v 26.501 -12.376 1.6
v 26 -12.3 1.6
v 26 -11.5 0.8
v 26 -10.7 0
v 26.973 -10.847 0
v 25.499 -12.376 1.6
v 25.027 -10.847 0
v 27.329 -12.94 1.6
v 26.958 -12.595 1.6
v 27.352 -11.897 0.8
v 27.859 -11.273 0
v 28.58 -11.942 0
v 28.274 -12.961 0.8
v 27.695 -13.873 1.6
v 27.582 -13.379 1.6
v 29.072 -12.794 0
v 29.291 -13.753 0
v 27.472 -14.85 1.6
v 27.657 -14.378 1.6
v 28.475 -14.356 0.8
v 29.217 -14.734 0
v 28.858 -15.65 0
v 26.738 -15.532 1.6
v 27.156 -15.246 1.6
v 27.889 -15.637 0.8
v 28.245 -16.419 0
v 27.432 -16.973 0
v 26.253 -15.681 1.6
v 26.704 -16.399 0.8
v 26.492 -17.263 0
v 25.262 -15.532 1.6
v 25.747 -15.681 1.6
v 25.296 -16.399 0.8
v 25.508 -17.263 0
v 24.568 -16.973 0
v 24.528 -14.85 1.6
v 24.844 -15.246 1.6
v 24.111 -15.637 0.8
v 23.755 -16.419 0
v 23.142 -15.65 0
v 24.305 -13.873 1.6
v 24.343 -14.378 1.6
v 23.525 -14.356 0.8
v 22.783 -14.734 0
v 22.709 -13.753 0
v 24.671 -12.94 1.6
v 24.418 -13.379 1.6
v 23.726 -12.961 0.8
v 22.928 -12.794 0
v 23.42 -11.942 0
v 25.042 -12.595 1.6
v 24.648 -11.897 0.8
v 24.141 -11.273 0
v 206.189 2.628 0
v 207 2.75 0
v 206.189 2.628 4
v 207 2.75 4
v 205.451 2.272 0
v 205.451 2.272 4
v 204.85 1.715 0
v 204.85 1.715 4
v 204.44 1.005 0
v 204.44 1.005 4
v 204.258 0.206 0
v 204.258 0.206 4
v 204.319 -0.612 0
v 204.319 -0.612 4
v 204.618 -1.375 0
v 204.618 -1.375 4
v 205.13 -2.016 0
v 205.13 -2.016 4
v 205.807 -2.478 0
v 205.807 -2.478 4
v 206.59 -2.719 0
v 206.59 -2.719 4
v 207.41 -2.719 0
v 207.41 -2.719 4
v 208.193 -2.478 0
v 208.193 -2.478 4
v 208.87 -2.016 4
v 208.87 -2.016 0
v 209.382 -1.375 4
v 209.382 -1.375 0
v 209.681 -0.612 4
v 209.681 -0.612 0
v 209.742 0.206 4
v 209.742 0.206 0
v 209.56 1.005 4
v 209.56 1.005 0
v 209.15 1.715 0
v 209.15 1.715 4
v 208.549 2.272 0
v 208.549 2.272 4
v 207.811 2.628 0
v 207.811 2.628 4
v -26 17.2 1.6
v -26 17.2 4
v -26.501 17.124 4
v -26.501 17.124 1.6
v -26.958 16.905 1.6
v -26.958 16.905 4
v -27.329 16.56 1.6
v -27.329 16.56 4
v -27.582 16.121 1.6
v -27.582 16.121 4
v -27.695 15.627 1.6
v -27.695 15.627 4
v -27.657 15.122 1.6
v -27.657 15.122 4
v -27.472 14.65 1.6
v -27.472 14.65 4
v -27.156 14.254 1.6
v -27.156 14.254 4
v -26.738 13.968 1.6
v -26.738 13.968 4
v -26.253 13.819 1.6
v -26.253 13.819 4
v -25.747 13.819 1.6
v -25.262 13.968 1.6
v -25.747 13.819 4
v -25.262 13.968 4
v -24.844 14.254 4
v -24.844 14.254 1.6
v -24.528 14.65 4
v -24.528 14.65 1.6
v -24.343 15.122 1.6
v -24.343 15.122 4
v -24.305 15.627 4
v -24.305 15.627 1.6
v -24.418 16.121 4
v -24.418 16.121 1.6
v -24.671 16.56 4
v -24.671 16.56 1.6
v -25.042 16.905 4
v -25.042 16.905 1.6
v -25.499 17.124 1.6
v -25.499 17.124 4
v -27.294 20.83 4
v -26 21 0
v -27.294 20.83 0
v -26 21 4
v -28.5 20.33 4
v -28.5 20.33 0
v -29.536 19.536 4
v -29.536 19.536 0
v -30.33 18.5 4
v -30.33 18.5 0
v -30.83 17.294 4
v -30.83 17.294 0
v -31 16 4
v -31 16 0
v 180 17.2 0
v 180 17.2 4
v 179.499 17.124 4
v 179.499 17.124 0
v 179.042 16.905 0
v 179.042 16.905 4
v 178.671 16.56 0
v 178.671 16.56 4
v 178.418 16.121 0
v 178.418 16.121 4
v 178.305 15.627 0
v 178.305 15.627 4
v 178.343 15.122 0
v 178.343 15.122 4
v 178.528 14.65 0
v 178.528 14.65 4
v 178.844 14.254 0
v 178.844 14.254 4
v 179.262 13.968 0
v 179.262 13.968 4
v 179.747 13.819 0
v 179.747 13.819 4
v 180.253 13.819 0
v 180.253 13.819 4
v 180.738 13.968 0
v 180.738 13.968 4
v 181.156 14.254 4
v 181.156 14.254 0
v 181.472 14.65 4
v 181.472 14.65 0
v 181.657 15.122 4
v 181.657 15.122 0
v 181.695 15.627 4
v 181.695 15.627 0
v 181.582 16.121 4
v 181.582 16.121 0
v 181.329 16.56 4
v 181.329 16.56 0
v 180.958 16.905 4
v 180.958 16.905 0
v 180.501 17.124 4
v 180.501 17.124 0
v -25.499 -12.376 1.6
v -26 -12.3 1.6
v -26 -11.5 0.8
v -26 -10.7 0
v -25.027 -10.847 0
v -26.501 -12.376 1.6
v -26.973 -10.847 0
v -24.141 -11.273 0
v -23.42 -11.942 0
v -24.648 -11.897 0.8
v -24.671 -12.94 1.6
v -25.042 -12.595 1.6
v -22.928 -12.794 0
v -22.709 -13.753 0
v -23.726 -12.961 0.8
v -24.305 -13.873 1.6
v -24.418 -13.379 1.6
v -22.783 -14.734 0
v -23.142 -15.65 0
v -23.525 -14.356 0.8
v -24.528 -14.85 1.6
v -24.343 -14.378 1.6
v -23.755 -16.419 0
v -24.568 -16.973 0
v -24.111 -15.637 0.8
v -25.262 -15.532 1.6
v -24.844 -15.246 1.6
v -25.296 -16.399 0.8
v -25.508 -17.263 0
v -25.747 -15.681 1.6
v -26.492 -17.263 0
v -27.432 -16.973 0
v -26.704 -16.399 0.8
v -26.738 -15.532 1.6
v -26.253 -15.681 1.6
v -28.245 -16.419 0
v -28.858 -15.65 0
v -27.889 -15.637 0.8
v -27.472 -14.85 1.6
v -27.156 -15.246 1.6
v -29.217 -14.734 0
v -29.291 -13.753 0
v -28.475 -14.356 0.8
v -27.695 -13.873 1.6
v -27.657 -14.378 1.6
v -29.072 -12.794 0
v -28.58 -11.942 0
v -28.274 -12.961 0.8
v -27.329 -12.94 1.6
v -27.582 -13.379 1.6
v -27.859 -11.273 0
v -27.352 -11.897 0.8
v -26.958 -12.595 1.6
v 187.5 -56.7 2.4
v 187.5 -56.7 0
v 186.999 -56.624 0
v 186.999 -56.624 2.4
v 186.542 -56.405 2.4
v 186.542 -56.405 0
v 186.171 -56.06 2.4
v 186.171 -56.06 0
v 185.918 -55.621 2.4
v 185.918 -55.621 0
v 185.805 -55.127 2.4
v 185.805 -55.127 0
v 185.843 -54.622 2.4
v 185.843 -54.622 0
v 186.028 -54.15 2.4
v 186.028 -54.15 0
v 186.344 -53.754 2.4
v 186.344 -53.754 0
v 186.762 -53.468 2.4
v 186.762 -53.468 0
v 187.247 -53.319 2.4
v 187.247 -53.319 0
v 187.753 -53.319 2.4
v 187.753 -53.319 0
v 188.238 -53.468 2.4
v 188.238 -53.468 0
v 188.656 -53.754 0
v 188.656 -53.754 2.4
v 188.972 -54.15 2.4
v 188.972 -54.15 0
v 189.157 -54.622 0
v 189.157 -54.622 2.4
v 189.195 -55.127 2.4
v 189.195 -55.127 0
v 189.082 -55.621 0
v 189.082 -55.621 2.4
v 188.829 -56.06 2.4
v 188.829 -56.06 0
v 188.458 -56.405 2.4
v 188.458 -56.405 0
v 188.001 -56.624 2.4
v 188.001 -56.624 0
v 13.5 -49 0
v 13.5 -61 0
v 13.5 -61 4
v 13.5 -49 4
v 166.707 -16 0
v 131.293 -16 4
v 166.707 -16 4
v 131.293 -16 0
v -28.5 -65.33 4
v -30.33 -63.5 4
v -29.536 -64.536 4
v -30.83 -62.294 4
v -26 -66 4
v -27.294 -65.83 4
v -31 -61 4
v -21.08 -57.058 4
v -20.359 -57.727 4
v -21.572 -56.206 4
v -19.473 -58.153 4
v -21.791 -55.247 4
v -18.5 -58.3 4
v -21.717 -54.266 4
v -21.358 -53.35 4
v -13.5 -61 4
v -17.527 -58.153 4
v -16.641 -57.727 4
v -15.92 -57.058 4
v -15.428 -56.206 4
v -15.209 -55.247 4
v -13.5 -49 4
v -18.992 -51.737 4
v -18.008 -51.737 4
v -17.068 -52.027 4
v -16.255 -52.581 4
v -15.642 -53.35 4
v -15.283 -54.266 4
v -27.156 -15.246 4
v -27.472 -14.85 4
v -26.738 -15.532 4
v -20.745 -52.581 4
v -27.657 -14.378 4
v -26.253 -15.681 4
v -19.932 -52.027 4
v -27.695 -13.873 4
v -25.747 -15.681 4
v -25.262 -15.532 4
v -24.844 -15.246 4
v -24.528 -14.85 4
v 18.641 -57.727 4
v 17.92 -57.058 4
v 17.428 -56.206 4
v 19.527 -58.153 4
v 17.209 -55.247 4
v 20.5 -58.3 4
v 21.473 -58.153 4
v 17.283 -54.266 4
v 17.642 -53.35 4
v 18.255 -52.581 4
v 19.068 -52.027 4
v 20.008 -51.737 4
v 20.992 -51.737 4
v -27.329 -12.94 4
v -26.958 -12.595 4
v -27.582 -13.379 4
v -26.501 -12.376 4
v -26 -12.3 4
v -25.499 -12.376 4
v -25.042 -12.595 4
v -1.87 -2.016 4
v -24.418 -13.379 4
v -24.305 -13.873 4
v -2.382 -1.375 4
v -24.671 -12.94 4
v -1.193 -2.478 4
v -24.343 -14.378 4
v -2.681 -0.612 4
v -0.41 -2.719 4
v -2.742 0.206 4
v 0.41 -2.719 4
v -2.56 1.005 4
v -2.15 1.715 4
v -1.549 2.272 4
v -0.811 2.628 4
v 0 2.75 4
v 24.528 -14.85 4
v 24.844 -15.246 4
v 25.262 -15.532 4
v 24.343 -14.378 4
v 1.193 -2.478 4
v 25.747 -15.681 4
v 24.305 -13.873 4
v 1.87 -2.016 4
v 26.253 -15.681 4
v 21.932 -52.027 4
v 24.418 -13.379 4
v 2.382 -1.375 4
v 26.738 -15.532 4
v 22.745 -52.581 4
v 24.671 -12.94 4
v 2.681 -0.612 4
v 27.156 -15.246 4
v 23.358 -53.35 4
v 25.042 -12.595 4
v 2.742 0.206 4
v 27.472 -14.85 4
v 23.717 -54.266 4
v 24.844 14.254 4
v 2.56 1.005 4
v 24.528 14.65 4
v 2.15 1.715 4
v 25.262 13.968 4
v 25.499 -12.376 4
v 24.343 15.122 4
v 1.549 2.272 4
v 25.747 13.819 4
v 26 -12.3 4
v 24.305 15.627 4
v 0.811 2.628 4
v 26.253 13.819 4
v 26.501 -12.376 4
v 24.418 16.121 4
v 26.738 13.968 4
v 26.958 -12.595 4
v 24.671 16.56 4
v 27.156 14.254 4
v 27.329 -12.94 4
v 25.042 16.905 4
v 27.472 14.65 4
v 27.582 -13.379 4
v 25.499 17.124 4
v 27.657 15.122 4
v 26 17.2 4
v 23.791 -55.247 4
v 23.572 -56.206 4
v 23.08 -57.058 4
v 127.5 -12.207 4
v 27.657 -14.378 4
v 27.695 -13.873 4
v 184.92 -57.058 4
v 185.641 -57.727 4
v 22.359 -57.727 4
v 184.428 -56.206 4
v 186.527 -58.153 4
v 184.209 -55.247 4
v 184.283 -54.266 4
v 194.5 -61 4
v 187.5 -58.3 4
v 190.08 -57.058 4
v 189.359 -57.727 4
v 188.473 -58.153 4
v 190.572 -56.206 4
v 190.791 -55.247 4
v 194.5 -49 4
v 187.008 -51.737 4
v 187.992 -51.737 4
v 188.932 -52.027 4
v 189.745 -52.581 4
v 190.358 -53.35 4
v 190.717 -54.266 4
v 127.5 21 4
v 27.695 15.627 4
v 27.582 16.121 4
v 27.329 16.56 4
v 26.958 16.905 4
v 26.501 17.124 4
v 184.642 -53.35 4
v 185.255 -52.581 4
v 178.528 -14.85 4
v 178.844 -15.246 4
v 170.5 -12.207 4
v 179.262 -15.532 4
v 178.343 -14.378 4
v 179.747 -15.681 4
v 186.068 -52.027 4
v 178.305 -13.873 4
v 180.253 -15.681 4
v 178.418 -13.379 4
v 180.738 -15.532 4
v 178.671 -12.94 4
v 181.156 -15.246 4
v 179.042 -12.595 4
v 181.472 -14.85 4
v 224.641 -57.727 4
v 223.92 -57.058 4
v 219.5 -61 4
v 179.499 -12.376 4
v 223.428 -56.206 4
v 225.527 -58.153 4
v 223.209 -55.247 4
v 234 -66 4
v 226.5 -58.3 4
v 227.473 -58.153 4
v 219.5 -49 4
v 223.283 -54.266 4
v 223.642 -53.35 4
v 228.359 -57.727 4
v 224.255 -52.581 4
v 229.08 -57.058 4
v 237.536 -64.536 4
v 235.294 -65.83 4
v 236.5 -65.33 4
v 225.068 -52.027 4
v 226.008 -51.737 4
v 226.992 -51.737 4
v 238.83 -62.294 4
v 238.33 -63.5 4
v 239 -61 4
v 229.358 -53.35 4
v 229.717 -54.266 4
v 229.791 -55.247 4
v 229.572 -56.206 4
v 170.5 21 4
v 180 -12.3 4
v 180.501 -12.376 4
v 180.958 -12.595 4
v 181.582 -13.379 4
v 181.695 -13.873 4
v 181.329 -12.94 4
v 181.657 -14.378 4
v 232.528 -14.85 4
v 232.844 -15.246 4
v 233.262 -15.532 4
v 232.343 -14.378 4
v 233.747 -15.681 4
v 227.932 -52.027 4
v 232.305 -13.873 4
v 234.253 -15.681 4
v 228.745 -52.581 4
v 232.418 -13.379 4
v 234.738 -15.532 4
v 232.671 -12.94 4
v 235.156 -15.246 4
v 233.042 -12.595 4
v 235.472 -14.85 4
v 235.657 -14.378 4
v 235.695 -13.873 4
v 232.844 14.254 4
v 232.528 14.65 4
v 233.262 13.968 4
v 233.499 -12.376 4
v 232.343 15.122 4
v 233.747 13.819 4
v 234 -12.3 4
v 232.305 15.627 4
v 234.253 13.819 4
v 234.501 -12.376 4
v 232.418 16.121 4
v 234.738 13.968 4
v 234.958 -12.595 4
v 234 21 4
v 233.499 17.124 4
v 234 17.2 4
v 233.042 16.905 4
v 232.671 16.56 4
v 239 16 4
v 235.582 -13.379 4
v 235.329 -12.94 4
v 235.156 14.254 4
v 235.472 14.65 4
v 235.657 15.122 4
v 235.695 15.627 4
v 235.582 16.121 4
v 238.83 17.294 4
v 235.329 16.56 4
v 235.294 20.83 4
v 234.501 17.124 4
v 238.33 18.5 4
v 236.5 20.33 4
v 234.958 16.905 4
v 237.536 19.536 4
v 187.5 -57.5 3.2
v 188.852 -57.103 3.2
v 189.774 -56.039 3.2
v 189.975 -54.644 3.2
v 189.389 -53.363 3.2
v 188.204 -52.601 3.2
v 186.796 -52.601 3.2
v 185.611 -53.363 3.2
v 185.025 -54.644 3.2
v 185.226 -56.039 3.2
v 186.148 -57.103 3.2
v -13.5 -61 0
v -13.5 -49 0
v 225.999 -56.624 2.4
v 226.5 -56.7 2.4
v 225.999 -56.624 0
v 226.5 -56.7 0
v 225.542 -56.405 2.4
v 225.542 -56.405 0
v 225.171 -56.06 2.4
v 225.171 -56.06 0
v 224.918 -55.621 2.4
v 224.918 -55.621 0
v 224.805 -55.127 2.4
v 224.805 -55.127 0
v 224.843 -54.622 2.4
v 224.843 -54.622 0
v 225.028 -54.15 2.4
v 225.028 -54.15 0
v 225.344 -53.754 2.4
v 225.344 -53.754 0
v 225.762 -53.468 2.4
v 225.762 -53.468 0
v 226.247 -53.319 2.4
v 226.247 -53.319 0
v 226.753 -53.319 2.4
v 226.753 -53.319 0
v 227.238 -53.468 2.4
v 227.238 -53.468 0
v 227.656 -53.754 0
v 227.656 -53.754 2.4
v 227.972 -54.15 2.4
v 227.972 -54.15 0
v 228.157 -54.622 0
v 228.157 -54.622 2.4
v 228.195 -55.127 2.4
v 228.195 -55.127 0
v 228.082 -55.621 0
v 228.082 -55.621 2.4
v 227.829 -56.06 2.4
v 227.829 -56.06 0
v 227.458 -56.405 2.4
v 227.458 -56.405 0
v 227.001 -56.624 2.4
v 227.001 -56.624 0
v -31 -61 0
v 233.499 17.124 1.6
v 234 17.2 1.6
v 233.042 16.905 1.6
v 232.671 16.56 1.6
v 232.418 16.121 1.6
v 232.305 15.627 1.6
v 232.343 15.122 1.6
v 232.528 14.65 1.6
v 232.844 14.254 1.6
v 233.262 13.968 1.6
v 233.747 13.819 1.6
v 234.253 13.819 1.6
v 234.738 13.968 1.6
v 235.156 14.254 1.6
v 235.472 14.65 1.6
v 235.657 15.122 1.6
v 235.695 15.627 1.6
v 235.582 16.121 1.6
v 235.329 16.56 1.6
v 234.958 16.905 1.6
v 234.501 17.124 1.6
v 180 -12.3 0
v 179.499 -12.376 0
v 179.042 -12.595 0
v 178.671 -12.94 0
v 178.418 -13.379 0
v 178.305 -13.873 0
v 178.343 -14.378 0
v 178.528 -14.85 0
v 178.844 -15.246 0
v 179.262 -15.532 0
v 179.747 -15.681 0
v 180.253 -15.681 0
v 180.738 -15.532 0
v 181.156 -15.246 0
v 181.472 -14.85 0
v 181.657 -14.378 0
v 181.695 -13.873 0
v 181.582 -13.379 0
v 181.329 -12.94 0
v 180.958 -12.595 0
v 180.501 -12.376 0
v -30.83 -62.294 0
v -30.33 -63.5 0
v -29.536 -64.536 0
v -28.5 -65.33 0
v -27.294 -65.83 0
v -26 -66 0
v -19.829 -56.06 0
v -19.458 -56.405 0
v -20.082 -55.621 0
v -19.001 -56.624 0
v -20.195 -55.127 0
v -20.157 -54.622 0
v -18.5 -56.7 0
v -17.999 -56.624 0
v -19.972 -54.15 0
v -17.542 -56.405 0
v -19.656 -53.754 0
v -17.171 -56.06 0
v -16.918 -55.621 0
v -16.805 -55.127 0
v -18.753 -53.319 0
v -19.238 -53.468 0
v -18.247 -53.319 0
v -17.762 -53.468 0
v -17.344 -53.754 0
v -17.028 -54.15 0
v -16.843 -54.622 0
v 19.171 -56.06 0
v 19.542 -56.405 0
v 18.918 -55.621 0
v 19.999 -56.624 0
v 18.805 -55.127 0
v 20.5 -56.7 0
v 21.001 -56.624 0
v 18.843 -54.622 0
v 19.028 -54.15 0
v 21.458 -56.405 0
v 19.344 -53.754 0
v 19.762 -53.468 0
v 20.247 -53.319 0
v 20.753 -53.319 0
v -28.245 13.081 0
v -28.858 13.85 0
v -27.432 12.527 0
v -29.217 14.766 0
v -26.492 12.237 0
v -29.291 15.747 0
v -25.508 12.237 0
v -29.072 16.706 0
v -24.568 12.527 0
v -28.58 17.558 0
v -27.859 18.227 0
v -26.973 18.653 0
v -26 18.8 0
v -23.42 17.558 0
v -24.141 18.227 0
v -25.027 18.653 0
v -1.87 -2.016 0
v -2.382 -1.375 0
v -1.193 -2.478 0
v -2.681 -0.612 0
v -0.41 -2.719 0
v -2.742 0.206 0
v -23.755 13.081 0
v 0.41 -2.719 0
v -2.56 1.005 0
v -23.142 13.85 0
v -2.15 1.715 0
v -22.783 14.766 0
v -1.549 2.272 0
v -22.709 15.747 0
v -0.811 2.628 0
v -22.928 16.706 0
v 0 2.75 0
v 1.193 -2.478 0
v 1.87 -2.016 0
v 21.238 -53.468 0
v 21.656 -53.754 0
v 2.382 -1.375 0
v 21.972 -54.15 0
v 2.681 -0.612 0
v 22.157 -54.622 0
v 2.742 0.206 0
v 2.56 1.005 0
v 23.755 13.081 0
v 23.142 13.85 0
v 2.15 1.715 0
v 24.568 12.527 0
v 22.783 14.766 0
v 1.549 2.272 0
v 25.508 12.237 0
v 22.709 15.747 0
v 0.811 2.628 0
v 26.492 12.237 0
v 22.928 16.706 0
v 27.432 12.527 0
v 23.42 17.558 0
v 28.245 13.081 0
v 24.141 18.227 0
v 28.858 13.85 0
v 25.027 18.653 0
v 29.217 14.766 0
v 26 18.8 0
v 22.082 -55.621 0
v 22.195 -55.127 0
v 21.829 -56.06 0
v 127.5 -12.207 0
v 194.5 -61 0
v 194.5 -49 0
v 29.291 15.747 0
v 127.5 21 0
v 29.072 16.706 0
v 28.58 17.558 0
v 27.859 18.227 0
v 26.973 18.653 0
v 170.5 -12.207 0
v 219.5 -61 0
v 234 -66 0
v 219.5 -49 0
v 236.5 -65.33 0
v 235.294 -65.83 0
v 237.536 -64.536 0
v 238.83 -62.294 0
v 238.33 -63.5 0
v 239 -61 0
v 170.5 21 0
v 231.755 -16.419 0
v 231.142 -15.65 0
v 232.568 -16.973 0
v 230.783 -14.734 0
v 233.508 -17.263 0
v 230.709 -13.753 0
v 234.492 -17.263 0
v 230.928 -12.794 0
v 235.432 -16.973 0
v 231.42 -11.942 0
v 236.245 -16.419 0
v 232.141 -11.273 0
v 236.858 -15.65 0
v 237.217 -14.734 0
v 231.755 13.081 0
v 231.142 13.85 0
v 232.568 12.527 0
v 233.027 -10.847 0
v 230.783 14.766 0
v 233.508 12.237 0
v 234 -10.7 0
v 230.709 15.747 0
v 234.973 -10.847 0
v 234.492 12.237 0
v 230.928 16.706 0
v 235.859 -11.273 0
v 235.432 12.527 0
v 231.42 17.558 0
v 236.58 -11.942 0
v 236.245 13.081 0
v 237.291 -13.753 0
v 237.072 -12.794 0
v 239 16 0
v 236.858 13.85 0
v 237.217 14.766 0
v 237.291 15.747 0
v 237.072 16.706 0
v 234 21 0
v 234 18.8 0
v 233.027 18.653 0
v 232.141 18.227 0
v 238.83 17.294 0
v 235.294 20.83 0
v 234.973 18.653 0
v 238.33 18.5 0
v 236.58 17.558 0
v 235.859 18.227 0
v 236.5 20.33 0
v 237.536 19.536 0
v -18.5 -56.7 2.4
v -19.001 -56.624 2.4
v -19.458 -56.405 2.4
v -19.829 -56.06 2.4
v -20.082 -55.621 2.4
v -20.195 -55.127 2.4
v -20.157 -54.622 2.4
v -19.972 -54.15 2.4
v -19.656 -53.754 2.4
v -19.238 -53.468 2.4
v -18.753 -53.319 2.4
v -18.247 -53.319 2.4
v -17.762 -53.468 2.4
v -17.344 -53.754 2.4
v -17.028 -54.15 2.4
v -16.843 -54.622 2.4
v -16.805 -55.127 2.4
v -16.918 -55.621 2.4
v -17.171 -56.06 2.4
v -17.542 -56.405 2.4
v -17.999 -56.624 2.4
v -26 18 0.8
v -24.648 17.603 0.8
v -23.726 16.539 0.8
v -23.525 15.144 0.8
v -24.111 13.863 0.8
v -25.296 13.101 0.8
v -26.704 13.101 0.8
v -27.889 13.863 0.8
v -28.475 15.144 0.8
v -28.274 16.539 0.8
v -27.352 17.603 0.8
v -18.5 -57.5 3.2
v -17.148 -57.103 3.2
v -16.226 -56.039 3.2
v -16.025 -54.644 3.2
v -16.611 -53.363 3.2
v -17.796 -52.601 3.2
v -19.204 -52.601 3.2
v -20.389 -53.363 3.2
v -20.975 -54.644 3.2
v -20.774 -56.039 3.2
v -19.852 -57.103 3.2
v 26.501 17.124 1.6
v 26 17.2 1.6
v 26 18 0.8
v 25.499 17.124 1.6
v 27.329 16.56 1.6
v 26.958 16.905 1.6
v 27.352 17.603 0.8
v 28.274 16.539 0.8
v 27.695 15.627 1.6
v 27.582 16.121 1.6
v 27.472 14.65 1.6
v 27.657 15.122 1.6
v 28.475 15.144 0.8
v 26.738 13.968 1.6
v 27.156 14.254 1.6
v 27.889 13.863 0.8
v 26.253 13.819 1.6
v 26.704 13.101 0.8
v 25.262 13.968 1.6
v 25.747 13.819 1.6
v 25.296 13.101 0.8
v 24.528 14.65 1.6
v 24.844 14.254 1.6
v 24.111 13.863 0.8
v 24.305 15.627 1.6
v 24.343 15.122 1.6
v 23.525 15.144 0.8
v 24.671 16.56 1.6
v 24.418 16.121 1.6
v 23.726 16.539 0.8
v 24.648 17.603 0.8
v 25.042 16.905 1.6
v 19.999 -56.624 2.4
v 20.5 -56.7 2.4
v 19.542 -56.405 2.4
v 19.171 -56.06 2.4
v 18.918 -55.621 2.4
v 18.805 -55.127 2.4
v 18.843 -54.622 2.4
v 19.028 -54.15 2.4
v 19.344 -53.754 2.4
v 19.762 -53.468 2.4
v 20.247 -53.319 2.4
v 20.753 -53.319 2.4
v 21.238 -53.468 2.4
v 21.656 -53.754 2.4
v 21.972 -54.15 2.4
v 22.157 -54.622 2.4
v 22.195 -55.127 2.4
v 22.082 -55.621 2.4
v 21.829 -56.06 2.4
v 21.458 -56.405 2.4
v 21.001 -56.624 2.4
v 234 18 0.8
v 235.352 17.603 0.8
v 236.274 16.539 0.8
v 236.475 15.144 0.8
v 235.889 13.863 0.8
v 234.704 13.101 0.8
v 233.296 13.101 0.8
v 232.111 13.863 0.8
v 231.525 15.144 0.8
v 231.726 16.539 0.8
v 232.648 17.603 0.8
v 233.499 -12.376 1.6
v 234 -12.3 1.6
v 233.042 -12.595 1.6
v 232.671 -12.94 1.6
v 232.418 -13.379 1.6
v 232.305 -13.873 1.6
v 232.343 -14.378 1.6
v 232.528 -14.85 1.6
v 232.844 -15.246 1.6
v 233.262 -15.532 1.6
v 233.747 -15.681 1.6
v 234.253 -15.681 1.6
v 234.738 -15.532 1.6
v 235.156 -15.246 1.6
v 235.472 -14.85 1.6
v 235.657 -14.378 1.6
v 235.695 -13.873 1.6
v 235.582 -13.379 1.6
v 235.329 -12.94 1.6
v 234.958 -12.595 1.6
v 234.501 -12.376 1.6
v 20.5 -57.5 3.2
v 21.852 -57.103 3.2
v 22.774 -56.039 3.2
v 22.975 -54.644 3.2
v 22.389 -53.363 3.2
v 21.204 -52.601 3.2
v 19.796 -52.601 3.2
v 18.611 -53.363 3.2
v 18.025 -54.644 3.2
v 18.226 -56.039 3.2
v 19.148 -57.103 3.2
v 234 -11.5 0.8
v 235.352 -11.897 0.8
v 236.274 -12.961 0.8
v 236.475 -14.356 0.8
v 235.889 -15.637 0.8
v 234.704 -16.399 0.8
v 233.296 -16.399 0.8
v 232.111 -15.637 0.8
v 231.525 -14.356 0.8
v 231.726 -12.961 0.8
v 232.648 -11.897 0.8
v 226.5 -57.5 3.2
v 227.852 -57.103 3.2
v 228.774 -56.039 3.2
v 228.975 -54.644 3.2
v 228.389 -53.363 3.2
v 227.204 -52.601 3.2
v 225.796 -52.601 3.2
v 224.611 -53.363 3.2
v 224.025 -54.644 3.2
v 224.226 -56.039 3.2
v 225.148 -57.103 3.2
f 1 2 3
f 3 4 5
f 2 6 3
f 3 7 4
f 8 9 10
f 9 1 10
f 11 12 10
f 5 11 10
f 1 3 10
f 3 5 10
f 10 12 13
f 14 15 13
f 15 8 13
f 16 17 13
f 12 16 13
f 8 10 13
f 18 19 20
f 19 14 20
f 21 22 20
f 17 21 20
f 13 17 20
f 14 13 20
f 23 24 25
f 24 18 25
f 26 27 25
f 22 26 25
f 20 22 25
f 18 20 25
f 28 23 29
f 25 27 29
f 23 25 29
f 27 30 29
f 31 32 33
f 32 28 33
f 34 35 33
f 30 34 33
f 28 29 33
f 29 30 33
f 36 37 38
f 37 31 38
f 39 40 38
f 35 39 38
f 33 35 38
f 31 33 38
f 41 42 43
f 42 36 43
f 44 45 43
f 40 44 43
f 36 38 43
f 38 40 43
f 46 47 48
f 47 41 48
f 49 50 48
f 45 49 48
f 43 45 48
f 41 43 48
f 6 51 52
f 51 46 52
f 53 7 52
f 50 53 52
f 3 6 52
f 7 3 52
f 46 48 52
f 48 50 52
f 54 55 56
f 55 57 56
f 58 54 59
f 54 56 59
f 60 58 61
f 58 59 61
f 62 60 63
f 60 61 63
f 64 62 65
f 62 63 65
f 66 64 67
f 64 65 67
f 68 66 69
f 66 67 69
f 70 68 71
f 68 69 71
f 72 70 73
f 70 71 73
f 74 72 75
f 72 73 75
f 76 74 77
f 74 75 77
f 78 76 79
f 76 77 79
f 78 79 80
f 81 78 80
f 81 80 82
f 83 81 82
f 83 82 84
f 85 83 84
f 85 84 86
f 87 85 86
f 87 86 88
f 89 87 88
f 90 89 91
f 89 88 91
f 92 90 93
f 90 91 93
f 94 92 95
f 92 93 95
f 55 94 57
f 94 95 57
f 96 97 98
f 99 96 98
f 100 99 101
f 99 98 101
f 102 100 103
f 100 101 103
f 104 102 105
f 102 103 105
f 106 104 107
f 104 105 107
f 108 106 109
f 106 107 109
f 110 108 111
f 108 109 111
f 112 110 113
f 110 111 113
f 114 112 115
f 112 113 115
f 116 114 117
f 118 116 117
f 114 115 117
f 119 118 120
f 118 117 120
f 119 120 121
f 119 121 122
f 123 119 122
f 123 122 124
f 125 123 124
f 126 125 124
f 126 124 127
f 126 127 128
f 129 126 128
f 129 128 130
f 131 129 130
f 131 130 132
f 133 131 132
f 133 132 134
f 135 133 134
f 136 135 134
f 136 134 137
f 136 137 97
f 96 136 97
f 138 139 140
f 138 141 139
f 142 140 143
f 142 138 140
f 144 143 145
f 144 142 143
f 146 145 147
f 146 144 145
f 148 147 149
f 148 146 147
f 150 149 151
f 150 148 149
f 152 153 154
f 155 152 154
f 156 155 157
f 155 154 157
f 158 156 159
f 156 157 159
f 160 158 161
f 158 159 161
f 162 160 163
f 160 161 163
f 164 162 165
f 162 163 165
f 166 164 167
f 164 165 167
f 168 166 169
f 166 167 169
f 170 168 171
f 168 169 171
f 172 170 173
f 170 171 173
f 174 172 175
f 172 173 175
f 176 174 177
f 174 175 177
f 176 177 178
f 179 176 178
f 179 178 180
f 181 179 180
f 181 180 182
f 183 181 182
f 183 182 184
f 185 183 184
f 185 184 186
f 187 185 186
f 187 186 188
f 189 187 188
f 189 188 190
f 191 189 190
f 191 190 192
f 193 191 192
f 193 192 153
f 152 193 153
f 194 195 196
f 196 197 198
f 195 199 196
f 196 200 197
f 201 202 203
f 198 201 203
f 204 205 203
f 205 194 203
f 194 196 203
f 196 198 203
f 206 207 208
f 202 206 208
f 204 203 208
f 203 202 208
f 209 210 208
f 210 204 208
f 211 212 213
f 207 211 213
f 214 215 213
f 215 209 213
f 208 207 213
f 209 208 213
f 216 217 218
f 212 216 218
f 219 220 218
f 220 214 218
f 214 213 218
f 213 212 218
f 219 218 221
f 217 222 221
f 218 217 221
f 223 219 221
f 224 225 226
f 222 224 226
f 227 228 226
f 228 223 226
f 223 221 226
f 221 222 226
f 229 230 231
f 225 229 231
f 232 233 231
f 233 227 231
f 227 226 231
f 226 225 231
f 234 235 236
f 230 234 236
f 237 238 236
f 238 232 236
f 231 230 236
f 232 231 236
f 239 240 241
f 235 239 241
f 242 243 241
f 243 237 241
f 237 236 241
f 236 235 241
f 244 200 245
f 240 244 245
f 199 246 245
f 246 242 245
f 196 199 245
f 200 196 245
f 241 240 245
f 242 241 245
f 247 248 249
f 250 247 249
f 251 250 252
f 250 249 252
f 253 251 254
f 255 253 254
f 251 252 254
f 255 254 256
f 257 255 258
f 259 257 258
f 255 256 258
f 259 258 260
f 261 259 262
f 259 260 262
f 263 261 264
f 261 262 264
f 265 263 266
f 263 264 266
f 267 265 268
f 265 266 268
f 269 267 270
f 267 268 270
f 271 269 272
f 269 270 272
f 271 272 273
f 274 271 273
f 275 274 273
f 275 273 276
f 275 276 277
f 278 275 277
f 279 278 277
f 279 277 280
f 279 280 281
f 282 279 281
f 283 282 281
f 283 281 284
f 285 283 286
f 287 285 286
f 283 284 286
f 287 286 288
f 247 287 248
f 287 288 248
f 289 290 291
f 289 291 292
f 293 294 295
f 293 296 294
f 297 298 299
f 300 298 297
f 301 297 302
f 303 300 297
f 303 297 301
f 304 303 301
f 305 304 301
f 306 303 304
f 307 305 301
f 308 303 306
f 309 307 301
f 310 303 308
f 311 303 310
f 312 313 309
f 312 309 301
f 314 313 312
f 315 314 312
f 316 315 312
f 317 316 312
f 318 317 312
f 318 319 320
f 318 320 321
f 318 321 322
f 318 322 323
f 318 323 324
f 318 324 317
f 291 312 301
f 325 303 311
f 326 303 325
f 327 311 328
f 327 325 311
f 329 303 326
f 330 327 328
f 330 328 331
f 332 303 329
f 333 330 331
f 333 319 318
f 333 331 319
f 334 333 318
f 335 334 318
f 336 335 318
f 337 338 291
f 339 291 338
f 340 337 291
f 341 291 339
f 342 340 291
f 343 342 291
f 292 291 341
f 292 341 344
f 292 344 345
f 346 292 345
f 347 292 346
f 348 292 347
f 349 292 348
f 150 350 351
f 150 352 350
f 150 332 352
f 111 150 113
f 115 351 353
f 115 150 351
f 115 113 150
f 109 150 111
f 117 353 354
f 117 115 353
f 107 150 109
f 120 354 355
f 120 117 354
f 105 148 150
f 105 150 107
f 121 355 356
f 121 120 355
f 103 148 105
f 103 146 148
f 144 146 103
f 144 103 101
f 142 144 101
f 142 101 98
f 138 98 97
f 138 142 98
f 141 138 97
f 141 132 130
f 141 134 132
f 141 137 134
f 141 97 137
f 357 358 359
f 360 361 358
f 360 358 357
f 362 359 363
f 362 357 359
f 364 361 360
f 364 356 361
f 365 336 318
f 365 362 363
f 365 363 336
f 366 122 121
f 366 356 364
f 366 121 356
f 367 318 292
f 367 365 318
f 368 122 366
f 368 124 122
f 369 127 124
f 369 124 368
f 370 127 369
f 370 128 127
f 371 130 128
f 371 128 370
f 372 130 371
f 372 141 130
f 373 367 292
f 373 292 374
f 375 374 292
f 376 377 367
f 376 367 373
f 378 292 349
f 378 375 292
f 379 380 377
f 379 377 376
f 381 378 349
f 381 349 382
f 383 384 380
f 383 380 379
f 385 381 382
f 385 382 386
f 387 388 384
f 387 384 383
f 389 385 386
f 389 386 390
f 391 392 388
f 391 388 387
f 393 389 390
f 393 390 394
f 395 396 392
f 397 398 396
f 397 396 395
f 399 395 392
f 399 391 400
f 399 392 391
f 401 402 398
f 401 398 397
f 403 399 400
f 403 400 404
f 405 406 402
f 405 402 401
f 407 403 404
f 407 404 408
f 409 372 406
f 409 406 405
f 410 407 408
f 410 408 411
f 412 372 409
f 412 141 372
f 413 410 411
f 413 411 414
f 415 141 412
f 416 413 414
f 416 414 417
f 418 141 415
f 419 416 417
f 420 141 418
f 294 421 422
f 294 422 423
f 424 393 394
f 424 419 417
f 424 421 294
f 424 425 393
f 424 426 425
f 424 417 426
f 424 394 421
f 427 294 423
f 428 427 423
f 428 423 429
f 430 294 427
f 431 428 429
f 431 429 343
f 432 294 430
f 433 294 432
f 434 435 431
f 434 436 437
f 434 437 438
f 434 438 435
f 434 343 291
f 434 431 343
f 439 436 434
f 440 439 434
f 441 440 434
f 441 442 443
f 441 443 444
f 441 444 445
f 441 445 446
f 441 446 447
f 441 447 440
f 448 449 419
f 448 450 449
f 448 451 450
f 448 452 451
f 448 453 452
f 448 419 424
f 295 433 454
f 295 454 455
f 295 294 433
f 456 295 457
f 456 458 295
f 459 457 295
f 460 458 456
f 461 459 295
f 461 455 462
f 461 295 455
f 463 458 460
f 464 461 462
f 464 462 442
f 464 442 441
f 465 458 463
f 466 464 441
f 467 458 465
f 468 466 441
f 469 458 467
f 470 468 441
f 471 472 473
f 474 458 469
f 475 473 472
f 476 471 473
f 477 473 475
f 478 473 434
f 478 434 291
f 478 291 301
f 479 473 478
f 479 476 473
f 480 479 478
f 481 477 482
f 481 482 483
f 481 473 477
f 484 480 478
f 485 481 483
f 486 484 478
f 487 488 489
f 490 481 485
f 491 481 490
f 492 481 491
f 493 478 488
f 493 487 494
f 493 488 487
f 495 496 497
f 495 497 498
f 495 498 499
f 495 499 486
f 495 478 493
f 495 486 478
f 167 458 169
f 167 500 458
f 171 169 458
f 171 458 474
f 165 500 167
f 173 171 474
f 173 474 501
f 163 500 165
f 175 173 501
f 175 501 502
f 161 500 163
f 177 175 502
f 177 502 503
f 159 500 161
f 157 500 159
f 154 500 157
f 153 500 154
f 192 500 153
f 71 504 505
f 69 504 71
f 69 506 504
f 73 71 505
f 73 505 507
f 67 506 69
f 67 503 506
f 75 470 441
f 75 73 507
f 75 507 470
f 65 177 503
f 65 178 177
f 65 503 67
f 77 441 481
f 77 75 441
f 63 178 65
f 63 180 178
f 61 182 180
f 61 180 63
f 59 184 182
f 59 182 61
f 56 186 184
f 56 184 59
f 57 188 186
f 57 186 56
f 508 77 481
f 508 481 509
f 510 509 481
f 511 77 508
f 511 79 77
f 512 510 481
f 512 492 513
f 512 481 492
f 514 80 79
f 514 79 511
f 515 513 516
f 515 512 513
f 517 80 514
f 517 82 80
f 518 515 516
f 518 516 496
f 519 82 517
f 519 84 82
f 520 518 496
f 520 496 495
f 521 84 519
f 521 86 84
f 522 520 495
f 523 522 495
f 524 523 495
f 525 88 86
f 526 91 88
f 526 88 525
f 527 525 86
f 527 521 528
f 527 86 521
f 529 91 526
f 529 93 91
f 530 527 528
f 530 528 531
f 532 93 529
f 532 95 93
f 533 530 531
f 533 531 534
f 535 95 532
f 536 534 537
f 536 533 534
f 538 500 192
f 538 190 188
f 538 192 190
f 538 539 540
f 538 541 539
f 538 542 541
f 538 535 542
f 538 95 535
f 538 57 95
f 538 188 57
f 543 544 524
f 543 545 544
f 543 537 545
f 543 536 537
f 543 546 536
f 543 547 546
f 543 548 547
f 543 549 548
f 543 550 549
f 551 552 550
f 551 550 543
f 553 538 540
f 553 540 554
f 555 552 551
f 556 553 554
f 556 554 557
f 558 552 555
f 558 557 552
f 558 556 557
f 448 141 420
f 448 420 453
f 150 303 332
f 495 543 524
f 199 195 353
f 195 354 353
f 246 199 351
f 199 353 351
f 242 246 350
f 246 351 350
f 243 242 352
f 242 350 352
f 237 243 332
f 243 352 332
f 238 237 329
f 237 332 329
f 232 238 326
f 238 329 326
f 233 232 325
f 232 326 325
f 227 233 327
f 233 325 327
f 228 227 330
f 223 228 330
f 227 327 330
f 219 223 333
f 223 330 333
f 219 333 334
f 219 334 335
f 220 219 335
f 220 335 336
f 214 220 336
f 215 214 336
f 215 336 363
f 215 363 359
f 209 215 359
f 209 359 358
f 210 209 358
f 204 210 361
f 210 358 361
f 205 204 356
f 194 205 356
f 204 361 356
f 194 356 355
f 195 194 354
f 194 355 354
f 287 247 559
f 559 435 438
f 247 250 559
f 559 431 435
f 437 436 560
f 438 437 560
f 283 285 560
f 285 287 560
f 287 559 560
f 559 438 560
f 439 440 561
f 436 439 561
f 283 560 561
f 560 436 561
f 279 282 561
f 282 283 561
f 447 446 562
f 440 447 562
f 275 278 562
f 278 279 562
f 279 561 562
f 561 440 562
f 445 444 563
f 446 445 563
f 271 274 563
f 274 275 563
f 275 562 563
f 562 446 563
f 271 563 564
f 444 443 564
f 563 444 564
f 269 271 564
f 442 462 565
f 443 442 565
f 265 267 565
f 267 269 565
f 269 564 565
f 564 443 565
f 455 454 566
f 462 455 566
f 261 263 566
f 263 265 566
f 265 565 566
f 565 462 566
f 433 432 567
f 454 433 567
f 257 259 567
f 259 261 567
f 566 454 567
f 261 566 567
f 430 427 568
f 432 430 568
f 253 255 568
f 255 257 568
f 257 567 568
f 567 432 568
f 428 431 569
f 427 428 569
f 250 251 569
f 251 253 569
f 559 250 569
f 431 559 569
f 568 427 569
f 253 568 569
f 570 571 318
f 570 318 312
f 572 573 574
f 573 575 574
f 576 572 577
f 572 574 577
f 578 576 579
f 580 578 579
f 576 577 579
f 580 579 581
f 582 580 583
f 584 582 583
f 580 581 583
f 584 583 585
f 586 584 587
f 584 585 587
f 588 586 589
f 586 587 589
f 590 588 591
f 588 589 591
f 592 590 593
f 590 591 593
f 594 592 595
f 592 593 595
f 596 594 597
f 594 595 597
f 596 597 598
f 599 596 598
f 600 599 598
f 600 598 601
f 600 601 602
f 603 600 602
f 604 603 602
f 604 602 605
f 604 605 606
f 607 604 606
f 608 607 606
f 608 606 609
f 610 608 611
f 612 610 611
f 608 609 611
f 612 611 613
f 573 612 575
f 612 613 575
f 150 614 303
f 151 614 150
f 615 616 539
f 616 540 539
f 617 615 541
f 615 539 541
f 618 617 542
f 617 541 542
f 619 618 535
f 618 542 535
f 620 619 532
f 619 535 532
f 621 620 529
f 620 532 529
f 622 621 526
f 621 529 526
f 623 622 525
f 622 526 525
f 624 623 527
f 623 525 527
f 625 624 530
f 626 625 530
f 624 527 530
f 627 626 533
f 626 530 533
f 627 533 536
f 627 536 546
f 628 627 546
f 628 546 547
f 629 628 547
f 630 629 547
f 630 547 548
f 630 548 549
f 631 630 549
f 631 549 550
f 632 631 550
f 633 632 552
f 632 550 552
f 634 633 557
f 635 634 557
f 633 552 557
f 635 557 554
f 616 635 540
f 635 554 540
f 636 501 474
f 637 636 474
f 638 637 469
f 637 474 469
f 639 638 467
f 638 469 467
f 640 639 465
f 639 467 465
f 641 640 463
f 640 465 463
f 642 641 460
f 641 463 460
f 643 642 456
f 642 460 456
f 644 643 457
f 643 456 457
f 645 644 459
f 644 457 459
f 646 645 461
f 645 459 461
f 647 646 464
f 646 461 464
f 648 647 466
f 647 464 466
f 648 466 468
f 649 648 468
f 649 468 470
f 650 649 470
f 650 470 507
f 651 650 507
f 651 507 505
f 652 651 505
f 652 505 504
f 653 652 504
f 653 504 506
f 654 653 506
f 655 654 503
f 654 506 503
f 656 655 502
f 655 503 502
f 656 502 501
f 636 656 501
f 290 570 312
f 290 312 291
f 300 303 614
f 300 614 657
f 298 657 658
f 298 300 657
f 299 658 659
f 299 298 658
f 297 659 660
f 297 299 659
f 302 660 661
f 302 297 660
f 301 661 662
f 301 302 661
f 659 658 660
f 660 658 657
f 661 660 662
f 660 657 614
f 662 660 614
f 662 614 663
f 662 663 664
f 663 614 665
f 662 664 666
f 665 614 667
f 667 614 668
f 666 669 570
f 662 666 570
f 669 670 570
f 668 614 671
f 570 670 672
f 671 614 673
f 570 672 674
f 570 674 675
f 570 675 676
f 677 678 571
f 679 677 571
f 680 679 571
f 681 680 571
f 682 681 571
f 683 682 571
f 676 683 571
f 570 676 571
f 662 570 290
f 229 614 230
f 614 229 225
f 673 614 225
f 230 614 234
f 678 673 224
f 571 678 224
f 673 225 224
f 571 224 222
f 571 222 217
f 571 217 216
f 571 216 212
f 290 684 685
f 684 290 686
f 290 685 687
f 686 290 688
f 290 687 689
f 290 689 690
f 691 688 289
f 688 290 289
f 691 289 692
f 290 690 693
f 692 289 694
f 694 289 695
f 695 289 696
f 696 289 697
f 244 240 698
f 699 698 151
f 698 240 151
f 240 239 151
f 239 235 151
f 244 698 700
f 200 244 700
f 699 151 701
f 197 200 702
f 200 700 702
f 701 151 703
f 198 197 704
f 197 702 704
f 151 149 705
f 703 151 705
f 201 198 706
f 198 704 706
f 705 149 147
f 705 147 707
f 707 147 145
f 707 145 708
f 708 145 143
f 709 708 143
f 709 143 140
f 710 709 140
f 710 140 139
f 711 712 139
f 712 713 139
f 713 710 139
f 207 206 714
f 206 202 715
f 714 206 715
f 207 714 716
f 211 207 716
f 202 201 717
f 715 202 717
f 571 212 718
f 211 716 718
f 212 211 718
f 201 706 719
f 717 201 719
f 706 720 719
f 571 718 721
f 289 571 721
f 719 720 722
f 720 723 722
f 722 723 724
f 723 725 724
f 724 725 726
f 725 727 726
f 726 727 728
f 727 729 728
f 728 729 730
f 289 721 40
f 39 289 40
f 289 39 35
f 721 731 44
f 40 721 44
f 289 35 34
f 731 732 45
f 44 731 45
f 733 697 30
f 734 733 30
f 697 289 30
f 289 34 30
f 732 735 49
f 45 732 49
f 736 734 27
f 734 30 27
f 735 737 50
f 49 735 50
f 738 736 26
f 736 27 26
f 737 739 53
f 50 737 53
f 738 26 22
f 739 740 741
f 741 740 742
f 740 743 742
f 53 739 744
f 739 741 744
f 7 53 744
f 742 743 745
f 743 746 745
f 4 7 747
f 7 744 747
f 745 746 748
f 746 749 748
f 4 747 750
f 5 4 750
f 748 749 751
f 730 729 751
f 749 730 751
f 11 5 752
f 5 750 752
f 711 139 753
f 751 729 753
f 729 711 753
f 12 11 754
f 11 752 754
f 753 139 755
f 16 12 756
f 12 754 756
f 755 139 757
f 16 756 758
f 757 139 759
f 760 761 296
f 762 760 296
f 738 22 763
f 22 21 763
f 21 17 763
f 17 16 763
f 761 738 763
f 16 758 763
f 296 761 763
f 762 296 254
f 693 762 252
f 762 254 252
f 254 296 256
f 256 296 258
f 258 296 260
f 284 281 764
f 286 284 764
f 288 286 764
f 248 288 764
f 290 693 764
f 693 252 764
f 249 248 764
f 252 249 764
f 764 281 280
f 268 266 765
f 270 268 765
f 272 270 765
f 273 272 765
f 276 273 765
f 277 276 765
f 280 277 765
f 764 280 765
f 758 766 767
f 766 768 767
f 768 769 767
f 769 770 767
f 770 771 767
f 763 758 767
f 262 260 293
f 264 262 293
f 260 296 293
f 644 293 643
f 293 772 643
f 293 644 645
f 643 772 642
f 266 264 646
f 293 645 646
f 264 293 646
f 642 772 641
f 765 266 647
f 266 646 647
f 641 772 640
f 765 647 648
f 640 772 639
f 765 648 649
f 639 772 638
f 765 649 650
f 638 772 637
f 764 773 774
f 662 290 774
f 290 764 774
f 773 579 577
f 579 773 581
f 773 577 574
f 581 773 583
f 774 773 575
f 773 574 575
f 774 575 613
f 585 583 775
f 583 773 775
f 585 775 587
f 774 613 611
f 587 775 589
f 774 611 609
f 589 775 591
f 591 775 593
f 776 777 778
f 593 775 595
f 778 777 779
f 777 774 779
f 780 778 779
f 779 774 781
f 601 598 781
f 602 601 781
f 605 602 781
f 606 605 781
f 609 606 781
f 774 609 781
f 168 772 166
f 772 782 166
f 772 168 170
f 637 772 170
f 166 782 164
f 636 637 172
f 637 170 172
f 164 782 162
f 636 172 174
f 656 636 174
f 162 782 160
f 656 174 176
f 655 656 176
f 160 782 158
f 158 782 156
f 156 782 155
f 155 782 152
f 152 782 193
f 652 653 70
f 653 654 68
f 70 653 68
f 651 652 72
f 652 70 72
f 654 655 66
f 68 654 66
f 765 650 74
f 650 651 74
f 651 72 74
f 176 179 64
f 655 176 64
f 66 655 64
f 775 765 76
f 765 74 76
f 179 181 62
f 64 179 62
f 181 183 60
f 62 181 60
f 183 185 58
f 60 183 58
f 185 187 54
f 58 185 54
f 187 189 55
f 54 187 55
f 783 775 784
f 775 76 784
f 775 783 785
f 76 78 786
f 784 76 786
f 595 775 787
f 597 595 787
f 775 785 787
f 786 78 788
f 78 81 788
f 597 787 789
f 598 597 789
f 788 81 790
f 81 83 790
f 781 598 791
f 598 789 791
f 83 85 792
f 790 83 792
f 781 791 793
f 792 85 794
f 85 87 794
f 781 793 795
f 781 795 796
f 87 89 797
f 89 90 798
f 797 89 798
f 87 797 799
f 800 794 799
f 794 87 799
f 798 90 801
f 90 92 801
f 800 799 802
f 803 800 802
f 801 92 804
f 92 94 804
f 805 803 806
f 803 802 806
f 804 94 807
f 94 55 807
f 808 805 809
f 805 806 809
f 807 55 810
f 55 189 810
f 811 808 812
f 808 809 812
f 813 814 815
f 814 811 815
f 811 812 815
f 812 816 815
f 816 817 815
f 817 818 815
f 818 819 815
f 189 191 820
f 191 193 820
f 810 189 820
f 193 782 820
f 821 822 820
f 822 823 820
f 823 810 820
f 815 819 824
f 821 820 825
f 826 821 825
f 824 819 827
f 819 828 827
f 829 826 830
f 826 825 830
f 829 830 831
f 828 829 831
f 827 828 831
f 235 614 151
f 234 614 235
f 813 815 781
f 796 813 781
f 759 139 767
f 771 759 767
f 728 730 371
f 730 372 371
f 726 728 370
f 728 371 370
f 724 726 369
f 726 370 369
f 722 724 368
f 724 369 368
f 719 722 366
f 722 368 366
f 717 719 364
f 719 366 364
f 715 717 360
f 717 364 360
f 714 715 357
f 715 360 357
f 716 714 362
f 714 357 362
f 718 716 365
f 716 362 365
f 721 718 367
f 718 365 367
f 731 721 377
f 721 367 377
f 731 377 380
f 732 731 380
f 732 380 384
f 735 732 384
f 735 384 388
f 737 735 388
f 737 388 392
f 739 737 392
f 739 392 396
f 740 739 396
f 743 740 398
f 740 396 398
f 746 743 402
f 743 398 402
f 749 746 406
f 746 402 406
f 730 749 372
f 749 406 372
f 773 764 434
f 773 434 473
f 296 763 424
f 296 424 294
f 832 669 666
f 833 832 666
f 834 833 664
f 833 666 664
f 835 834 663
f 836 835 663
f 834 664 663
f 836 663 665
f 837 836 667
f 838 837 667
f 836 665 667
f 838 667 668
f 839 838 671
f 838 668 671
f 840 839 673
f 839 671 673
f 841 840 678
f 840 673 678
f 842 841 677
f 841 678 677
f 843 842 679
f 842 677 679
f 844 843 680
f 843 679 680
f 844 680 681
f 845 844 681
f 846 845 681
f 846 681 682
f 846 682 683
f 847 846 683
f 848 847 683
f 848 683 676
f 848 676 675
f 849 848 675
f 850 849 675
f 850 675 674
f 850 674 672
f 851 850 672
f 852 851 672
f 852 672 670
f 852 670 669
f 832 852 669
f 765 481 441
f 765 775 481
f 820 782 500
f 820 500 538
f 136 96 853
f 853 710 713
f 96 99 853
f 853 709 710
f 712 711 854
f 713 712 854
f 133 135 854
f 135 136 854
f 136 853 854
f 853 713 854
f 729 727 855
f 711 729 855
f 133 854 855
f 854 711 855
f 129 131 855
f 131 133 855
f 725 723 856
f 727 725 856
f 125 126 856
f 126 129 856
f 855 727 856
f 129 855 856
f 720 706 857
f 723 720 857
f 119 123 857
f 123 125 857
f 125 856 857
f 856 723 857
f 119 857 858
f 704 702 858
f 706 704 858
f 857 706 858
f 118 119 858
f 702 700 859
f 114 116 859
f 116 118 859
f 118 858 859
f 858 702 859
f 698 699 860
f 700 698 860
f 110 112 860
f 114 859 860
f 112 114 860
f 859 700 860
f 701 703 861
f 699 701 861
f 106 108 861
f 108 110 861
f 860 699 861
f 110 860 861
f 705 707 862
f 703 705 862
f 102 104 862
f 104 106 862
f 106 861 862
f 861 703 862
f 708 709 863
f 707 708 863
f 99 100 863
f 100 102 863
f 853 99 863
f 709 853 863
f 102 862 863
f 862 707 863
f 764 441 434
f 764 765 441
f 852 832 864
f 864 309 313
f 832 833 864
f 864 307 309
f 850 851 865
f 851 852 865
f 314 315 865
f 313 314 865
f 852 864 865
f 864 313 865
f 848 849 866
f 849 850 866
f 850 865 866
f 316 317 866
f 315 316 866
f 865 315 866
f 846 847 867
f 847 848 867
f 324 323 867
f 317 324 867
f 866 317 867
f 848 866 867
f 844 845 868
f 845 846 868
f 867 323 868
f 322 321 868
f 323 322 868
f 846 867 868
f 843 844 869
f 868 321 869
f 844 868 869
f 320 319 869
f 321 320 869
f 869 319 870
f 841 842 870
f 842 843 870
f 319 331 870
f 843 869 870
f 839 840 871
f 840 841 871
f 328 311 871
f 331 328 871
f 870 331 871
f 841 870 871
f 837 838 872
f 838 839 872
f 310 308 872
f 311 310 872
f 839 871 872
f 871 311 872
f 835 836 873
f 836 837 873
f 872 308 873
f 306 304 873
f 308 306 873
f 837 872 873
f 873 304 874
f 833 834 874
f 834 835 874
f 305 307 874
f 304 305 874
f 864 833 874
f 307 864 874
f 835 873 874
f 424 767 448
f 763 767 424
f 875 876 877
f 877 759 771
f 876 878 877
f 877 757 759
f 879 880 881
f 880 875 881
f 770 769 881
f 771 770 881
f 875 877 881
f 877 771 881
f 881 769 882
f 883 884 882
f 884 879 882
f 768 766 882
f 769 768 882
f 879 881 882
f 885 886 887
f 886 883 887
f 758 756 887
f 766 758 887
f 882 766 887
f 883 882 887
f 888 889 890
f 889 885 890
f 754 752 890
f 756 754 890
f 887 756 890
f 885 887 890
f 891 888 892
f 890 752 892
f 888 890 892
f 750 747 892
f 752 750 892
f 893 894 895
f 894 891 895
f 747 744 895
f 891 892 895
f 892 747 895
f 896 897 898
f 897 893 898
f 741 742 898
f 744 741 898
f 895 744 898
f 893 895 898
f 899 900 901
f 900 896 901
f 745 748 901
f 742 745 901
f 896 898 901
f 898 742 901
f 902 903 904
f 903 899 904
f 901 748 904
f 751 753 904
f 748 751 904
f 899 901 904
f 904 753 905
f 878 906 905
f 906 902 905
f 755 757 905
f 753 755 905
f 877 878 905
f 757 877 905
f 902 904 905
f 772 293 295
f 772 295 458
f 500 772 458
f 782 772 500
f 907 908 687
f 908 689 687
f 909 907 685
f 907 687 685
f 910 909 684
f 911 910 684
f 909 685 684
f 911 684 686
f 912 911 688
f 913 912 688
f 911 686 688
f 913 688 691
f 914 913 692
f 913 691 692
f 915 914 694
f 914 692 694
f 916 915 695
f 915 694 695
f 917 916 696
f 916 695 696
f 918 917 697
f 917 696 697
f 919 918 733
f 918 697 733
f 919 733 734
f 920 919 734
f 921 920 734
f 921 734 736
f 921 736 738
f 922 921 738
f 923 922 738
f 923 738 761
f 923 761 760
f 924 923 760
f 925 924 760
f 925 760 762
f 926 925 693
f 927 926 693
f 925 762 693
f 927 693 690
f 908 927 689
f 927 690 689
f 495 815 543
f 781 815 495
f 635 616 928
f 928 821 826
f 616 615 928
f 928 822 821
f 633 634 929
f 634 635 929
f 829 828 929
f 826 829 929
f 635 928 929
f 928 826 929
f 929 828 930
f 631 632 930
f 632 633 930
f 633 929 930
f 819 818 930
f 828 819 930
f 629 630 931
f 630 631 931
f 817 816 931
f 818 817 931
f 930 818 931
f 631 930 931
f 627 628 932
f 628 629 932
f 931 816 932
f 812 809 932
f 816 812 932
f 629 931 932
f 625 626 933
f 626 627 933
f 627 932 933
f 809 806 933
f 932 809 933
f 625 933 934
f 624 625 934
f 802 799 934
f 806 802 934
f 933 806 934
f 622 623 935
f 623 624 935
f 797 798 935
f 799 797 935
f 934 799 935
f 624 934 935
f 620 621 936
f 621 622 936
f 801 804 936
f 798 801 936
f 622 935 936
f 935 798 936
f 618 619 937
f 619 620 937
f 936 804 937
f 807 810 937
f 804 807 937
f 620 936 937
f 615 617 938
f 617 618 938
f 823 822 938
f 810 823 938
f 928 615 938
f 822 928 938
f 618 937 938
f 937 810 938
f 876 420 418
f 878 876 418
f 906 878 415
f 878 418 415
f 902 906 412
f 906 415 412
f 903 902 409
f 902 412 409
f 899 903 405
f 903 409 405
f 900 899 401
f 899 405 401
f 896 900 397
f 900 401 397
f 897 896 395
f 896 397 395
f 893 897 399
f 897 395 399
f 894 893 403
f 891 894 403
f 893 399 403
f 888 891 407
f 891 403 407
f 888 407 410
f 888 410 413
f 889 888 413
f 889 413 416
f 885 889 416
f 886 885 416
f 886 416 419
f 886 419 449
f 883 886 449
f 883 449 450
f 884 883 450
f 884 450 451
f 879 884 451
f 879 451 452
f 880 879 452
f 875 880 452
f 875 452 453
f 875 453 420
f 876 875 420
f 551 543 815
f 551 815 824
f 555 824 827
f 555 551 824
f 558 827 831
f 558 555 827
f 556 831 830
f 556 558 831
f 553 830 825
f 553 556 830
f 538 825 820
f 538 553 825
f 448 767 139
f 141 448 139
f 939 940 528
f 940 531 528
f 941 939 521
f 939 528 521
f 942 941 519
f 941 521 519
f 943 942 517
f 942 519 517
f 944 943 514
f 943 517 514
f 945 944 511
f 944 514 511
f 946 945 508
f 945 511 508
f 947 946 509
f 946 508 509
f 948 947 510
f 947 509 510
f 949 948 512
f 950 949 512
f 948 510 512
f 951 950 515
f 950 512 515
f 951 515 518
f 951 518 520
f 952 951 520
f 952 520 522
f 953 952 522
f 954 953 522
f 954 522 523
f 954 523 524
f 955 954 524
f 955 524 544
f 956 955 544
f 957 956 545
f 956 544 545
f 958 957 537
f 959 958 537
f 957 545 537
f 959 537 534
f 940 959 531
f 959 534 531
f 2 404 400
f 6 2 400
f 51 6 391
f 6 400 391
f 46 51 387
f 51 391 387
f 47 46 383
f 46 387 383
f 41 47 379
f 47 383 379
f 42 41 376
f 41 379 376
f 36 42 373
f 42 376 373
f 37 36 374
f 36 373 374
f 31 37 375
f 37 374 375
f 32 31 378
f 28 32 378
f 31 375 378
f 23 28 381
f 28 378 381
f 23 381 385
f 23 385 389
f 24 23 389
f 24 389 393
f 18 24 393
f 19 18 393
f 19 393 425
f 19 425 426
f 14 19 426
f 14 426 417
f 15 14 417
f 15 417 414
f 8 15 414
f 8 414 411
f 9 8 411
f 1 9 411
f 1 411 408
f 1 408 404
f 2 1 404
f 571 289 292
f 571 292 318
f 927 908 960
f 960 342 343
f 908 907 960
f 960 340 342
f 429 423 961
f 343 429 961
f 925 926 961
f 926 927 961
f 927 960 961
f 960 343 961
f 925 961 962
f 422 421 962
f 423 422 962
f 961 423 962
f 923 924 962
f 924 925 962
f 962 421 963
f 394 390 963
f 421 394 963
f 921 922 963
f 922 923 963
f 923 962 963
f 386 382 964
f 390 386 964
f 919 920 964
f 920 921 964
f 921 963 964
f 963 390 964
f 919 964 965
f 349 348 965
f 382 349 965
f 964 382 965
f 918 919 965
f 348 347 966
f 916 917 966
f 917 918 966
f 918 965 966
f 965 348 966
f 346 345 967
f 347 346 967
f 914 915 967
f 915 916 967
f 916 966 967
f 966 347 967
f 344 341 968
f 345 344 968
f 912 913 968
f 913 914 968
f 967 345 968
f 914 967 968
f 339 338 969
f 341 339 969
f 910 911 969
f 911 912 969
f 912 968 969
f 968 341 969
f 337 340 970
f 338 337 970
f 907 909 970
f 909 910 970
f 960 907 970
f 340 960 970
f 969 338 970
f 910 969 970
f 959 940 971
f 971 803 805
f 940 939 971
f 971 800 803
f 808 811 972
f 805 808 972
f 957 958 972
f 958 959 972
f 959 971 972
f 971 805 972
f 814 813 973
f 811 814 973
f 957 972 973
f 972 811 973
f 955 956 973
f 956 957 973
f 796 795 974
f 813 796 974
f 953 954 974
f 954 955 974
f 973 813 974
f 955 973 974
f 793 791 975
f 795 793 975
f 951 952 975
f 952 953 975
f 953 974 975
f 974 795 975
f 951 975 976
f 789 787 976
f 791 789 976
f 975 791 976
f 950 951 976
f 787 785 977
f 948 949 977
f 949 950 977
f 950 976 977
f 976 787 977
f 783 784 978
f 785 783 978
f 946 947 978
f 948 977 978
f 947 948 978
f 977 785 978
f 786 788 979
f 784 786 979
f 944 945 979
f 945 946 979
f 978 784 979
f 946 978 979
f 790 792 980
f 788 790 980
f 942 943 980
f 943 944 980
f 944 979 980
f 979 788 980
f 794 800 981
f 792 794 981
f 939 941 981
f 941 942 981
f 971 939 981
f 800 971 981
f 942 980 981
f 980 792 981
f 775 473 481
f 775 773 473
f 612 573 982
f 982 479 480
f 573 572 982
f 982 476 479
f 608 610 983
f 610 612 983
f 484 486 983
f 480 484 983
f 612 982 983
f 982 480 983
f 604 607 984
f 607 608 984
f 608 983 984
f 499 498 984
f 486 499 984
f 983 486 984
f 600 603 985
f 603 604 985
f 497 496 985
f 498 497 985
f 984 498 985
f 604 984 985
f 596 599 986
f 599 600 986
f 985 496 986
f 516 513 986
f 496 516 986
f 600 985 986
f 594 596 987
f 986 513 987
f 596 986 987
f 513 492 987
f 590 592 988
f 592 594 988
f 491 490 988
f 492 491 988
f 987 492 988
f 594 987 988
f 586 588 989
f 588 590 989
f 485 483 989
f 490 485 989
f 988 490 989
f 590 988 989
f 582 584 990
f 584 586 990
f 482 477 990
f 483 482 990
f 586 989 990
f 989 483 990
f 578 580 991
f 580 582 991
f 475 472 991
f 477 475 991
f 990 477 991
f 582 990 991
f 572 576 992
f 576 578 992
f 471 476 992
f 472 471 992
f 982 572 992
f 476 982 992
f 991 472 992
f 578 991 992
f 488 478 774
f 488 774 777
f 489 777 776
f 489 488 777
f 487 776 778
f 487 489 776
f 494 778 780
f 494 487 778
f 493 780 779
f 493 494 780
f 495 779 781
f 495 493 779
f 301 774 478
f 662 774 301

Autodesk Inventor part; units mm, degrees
ref_plane "YZ Plane" through (0, 0, 0) normal (1, 0, 0) x (0, 1, 0)
ref_plane "XZ Plane" through (0, 0, 0) normal (0, 1, 0) x (-1, 0, 0)
ref_plane "XY Plane" through (0, 0, 0) normal (0, 0, 1) x (1, 0, 0)
ref_plane "Work Plane1" through (0, 0, 0) normal (0, 0, 1) x (1, 0, 0)
sketch "Sketch1" plane through (0, 0, 0) normal (0, 0, 1) x (1, 0, 0)
  circle A0 centre (15.5, -15.5) radius 1.7 projected
  circle A1 centre (15.5, 15.5) radius 1.7 projected
  circle A2 centre (-15.5, 15.5) radius 1.7 projected
  circle A3 centre (-15.5, -15.5) radius 1.7 projected
  circle A4 centre (0, 0) radius 11 projected
  line L0 (17.5, 21) -> (21, 17.5) projected
  line L1 (17.5, 21) -> (-17.5, 21) projected
  line L2 (-21, 17.5) -> (-17.5, 21) projected
  line L3 (-21, 17.5) -> (-21, -17.5) projected
  line L4 (-17.5, -21) -> (-21, -17.5) projected
  line L5 (-17.5, -21) -> (17.5, -21) projected
  line L6 (21, -17.5) -> (17.5, -21) projected
  line L7 (21, -17.5) -> (21, 17.5) projected
  line L8 (-31, 21) -> (239, 21)
  line L9 (239, 21) -> (239, -66)
  line L10 (239, -66) -> (-31, -66)
  line L11 (-31, -66) -> (-31, 21)
  circle A5 centre (207, 0) radius 22 construction
  line L12 (0, 0) -> (239, 0) construction
  circle A6 centre (0, 0) radius 11.5
  line L13 (104, 21) -> (104, -66) construction
  line L14 (-15.5, 15.5) -> (-31, 15.5) construction
  line L15 (207, 0) -> (207, -66) construction
  line L16 (0, 0) -> (0, -66) construction
  line L17 (219.5, -49) -> (194.5, -49)
  line L18 (194.5, -49) -> (194.5, -61)
  line L19 (194.5, -61) -> (219.5, -61)
  line L20 (219.5, -61) -> (219.5, -49)
  line L21 (219.5, -49) -> (194.5, -61) construction
  line L22 (194.5, -49) -> (219.5, -61) construction
  line L23 (219.5, -55) -> (194.5, -55) construction
  line L24 (-13.5, -61) -> (13.5, -61)
  line L25 (13.5, -61) -> (13.5, -49)
  line L26 (13.5, -49) -> (-13.5, -49)
  line L27 (-13.5, -49) -> (-13.5, -61)
  line L28 (-13.5, -61) -> (13.5, -49) construction
  line L29 (13.5, -61) -> (-13.5, -49) construction
  line L30 (170, 23) -> (166.5, 26.5) projected
  line L31 (170, 23) -> (170, -12) projected
  line L32 (166.5, -15.5) -> (170, -12) projected
  line L33 (166.5, -15.5) -> (131.5, -15.5) projected
  line L34 (128, -12) -> (131.5, -15.5) projected
  line L35 (128, -12) -> (128, 23) projected
  line L36 (131.5, 26.5) -> (128, 23) projected
  line L37 (131.5, 26.5) -> (166.5, 26.5) projected
  line L38 (127.5, 23.2071) -> (127.5, -12.2071)
  line L39 (127.5, -12.2071) -> (131.2929, -16)
  line L40 (131.2929, -16) -> (166.7071, -16)
  line L41 (166.7071, -16) -> (170.5, -12.2071)
  line L42 (170.5, -12.2071) -> (170.5, 23.2071)
  line L43 (170.5, 23.2071) -> (166.7071, 27)
  line L44 (166.7071, 27) -> (131.2929, 27)
  line L45 (131.2929, 27) -> (127.5, 23.2071)
  line L46 (-32.0916, -17) -> (139.8961, -17) construction
  point P0 (-26, 15.5)
  point P1 (-26, -14)
  point P2 (234, 15.5)
  point P3 (234, -14)
  point P4 (207, -55)
  point P5 (226.5, -55)
  point P6 (187.5, -55)
  point P7 (0, -55)
  point P8 (20.5, -55)
  point P9 (-18.5, -55)
  point P10 (26, 15.5)
  point P11 (26, -14)
  point P12 (180, 15.5)
  point P13 (180, -14)
  point P14 (170.5, 21)
  point P15 (127.5, 21)
  dimension "d0" = 45
  dimension "d1" = 270
  dimension "d2" = 44
  dimension "d3" = 0.5
  dimension "d21" = 10
  dimension "d22" = 32
  dimension "d23" = 5
  dimension "d31" = 25
  dimension "d32" = 12
  dimension "d33" = 5
  dimension "d34" = 7
  dimension "d42" = 0.5
  dimension "d50" = 5
  dimension "d51" = 17
  dimension "d52" = 3
extrude "Extrusion1" add sketch "Sketch1" along normal blind 4 contours A0 | A1 | A2 | A3 | A4 | L8 L38 L39 L40 L41 L42 L9 L10 L11 L2 L3 L4 L5 L6 L7 L0 | L0 L7 L6 L5 L4 L3 L2 L1 | A6
hole "Hole1" at (207, 0, 0) direction (0, 0, 1) diameter 5.5 end through all clearance for "Countersunk Head GOST 12876-67" size "M5" standard "GOST"
sketch "Sketch2" plane through (0, 0, 4) normal (0, 0, 1) x (1, 0, 0)
  circle A0 centre (15.5, -15.5) radius 1.7 projected
  circle A1 centre (15.5, 15.5) radius 1.7 projected
  circle A2 centre (-15.5, 15.5) radius 1.7 projected
  circle A3 centre (-15.5, -15.5) radius 1.7 projected
  circle A4 centre (0, 0) radius 11 projected
  line L0 (17.5, 21) -> (21, 17.5) projected
  line L1 (17.5, 21) -> (-17.5, 21) projected
  line L2 (-21, 17.5) -> (-17.5, 21) projected
  line L3 (-21, 17.5) -> (-21, -17.5) projected
  line L4 (-17.5, -21) -> (-21, -17.5) projected
  line L5 (-17.5, -21) -> (17.5, -21) projected
  line L6 (21, -17.5) -> (17.5, -21) projected
  line L7 (21, -17.5) -> (21, 17.5) projected
  point P0 (-18.5, -55)
  point P1 (20.5, -55)
  point P2 (187.5, -55)
  point P3 (226.5, -55)
fillet "Fillet1" radius 5 4 edges at (-31, 21, 2) (-31, -66, 2) (239, 21, 2) (239, -66, 2)
hole "Hole3" at (-26, -14, 0) at (-26, 15.5, 0) at (234, 15.5, 0) at (234, -14, 0) at (26, 15.5, 0) at (26, -14, 0) direction (0, 0, 1) diameter 3.4 end through all countersink diameter 6.6 countersink angle 90 clearance for "Countersunk Head GOST 12876-67" size "M3" standard "GOST"
hole "Hole4" at (-18.5, -55, 4) at (20.5, -55, 4) at (187.5, -55, 4) at (226.5, -55, 4) direction (0, 0, -1) diameter 3.4 end through all countersink diameter 6.6 countersink angle 90 clearance for "Countersunk Head GOST 12876-67" size "M3" standard "GOST"
hole "Hole5" at (180, 15.5, 0) at (180, -14, 0) direction (0, 0, 1) diameter 3.4 end through all clearance for "Countersunk Head GOST 12876-67" size "M3" standard "GOST"
hole "Hole6" at (0, 0, 0) direction (0, 0, 1) diameter 5.5 depth 8
properties part number "plate_1"
